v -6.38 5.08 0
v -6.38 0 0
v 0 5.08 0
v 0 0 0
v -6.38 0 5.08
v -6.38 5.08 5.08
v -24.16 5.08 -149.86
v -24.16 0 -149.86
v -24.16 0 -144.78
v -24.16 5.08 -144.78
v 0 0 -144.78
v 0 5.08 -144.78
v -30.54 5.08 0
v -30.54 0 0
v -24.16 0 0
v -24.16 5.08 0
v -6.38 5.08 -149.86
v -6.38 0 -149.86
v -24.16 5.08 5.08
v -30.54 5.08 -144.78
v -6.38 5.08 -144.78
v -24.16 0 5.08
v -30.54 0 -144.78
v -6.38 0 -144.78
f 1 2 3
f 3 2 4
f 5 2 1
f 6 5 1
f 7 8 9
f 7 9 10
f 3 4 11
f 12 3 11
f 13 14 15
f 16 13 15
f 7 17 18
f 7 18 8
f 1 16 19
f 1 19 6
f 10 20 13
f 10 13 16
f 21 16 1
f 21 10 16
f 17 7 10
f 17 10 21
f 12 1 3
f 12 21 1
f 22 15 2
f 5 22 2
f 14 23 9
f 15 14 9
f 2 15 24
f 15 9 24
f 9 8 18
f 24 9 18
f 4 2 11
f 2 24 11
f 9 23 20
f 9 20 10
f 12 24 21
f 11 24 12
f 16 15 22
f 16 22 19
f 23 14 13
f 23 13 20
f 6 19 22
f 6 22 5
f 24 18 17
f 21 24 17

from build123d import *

# Parameters (mm, degrees)
SKETCH1_W           = 30.54
SKETCH1_H           = 144.78
BOSS_EXTRUDE1_DEPTH = 5.08
SKETCH2_W           = 17.78
SKETCH2_H           = 5.08
BOSS_EXTRUDE2_DEPTH = 5.08
SKETCH3_W           = 17.78
SKETCH3_H           = 5.08
BOSS_EXTRUDE3_DEPTH = 5.08


with BuildPart() as part:
    # Sketch1 → Boss-Extrude1 (new body)
    with BuildSketch(Plane(origin=(0, 0, 0), x_dir=(1, 0, 0), z_dir=(0, 1, 0))):
        with Locations((-15.27, 72.39)):
            Rectangle(SKETCH1_W, SKETCH1_H)
    extrude(amount=BOSS_EXTRUDE1_DEPTH)

    # Sketch2 → Boss-Extrude2 (add)
    with BuildSketch(Plane.XY):
        with Locations((-15.27, 2.54)):
            Rectangle(SKETCH2_W, SKETCH2_H)
    extrude(amount=BOSS_EXTRUDE2_DEPTH)

    # Sketch3 → Boss-Extrude3 (add)
    with BuildSketch(Plane(origin=(0, 0, -144.78), x_dir=(-1, 0, 0), z_dir=(0, 0, -1))):
        with Locations((15.27, 2.54)):
            Rectangle(SKETCH3_W, SKETCH3_H)
    extrude(amount=BOSS_EXTRUDE3_DEPTH)


solid = part.part
